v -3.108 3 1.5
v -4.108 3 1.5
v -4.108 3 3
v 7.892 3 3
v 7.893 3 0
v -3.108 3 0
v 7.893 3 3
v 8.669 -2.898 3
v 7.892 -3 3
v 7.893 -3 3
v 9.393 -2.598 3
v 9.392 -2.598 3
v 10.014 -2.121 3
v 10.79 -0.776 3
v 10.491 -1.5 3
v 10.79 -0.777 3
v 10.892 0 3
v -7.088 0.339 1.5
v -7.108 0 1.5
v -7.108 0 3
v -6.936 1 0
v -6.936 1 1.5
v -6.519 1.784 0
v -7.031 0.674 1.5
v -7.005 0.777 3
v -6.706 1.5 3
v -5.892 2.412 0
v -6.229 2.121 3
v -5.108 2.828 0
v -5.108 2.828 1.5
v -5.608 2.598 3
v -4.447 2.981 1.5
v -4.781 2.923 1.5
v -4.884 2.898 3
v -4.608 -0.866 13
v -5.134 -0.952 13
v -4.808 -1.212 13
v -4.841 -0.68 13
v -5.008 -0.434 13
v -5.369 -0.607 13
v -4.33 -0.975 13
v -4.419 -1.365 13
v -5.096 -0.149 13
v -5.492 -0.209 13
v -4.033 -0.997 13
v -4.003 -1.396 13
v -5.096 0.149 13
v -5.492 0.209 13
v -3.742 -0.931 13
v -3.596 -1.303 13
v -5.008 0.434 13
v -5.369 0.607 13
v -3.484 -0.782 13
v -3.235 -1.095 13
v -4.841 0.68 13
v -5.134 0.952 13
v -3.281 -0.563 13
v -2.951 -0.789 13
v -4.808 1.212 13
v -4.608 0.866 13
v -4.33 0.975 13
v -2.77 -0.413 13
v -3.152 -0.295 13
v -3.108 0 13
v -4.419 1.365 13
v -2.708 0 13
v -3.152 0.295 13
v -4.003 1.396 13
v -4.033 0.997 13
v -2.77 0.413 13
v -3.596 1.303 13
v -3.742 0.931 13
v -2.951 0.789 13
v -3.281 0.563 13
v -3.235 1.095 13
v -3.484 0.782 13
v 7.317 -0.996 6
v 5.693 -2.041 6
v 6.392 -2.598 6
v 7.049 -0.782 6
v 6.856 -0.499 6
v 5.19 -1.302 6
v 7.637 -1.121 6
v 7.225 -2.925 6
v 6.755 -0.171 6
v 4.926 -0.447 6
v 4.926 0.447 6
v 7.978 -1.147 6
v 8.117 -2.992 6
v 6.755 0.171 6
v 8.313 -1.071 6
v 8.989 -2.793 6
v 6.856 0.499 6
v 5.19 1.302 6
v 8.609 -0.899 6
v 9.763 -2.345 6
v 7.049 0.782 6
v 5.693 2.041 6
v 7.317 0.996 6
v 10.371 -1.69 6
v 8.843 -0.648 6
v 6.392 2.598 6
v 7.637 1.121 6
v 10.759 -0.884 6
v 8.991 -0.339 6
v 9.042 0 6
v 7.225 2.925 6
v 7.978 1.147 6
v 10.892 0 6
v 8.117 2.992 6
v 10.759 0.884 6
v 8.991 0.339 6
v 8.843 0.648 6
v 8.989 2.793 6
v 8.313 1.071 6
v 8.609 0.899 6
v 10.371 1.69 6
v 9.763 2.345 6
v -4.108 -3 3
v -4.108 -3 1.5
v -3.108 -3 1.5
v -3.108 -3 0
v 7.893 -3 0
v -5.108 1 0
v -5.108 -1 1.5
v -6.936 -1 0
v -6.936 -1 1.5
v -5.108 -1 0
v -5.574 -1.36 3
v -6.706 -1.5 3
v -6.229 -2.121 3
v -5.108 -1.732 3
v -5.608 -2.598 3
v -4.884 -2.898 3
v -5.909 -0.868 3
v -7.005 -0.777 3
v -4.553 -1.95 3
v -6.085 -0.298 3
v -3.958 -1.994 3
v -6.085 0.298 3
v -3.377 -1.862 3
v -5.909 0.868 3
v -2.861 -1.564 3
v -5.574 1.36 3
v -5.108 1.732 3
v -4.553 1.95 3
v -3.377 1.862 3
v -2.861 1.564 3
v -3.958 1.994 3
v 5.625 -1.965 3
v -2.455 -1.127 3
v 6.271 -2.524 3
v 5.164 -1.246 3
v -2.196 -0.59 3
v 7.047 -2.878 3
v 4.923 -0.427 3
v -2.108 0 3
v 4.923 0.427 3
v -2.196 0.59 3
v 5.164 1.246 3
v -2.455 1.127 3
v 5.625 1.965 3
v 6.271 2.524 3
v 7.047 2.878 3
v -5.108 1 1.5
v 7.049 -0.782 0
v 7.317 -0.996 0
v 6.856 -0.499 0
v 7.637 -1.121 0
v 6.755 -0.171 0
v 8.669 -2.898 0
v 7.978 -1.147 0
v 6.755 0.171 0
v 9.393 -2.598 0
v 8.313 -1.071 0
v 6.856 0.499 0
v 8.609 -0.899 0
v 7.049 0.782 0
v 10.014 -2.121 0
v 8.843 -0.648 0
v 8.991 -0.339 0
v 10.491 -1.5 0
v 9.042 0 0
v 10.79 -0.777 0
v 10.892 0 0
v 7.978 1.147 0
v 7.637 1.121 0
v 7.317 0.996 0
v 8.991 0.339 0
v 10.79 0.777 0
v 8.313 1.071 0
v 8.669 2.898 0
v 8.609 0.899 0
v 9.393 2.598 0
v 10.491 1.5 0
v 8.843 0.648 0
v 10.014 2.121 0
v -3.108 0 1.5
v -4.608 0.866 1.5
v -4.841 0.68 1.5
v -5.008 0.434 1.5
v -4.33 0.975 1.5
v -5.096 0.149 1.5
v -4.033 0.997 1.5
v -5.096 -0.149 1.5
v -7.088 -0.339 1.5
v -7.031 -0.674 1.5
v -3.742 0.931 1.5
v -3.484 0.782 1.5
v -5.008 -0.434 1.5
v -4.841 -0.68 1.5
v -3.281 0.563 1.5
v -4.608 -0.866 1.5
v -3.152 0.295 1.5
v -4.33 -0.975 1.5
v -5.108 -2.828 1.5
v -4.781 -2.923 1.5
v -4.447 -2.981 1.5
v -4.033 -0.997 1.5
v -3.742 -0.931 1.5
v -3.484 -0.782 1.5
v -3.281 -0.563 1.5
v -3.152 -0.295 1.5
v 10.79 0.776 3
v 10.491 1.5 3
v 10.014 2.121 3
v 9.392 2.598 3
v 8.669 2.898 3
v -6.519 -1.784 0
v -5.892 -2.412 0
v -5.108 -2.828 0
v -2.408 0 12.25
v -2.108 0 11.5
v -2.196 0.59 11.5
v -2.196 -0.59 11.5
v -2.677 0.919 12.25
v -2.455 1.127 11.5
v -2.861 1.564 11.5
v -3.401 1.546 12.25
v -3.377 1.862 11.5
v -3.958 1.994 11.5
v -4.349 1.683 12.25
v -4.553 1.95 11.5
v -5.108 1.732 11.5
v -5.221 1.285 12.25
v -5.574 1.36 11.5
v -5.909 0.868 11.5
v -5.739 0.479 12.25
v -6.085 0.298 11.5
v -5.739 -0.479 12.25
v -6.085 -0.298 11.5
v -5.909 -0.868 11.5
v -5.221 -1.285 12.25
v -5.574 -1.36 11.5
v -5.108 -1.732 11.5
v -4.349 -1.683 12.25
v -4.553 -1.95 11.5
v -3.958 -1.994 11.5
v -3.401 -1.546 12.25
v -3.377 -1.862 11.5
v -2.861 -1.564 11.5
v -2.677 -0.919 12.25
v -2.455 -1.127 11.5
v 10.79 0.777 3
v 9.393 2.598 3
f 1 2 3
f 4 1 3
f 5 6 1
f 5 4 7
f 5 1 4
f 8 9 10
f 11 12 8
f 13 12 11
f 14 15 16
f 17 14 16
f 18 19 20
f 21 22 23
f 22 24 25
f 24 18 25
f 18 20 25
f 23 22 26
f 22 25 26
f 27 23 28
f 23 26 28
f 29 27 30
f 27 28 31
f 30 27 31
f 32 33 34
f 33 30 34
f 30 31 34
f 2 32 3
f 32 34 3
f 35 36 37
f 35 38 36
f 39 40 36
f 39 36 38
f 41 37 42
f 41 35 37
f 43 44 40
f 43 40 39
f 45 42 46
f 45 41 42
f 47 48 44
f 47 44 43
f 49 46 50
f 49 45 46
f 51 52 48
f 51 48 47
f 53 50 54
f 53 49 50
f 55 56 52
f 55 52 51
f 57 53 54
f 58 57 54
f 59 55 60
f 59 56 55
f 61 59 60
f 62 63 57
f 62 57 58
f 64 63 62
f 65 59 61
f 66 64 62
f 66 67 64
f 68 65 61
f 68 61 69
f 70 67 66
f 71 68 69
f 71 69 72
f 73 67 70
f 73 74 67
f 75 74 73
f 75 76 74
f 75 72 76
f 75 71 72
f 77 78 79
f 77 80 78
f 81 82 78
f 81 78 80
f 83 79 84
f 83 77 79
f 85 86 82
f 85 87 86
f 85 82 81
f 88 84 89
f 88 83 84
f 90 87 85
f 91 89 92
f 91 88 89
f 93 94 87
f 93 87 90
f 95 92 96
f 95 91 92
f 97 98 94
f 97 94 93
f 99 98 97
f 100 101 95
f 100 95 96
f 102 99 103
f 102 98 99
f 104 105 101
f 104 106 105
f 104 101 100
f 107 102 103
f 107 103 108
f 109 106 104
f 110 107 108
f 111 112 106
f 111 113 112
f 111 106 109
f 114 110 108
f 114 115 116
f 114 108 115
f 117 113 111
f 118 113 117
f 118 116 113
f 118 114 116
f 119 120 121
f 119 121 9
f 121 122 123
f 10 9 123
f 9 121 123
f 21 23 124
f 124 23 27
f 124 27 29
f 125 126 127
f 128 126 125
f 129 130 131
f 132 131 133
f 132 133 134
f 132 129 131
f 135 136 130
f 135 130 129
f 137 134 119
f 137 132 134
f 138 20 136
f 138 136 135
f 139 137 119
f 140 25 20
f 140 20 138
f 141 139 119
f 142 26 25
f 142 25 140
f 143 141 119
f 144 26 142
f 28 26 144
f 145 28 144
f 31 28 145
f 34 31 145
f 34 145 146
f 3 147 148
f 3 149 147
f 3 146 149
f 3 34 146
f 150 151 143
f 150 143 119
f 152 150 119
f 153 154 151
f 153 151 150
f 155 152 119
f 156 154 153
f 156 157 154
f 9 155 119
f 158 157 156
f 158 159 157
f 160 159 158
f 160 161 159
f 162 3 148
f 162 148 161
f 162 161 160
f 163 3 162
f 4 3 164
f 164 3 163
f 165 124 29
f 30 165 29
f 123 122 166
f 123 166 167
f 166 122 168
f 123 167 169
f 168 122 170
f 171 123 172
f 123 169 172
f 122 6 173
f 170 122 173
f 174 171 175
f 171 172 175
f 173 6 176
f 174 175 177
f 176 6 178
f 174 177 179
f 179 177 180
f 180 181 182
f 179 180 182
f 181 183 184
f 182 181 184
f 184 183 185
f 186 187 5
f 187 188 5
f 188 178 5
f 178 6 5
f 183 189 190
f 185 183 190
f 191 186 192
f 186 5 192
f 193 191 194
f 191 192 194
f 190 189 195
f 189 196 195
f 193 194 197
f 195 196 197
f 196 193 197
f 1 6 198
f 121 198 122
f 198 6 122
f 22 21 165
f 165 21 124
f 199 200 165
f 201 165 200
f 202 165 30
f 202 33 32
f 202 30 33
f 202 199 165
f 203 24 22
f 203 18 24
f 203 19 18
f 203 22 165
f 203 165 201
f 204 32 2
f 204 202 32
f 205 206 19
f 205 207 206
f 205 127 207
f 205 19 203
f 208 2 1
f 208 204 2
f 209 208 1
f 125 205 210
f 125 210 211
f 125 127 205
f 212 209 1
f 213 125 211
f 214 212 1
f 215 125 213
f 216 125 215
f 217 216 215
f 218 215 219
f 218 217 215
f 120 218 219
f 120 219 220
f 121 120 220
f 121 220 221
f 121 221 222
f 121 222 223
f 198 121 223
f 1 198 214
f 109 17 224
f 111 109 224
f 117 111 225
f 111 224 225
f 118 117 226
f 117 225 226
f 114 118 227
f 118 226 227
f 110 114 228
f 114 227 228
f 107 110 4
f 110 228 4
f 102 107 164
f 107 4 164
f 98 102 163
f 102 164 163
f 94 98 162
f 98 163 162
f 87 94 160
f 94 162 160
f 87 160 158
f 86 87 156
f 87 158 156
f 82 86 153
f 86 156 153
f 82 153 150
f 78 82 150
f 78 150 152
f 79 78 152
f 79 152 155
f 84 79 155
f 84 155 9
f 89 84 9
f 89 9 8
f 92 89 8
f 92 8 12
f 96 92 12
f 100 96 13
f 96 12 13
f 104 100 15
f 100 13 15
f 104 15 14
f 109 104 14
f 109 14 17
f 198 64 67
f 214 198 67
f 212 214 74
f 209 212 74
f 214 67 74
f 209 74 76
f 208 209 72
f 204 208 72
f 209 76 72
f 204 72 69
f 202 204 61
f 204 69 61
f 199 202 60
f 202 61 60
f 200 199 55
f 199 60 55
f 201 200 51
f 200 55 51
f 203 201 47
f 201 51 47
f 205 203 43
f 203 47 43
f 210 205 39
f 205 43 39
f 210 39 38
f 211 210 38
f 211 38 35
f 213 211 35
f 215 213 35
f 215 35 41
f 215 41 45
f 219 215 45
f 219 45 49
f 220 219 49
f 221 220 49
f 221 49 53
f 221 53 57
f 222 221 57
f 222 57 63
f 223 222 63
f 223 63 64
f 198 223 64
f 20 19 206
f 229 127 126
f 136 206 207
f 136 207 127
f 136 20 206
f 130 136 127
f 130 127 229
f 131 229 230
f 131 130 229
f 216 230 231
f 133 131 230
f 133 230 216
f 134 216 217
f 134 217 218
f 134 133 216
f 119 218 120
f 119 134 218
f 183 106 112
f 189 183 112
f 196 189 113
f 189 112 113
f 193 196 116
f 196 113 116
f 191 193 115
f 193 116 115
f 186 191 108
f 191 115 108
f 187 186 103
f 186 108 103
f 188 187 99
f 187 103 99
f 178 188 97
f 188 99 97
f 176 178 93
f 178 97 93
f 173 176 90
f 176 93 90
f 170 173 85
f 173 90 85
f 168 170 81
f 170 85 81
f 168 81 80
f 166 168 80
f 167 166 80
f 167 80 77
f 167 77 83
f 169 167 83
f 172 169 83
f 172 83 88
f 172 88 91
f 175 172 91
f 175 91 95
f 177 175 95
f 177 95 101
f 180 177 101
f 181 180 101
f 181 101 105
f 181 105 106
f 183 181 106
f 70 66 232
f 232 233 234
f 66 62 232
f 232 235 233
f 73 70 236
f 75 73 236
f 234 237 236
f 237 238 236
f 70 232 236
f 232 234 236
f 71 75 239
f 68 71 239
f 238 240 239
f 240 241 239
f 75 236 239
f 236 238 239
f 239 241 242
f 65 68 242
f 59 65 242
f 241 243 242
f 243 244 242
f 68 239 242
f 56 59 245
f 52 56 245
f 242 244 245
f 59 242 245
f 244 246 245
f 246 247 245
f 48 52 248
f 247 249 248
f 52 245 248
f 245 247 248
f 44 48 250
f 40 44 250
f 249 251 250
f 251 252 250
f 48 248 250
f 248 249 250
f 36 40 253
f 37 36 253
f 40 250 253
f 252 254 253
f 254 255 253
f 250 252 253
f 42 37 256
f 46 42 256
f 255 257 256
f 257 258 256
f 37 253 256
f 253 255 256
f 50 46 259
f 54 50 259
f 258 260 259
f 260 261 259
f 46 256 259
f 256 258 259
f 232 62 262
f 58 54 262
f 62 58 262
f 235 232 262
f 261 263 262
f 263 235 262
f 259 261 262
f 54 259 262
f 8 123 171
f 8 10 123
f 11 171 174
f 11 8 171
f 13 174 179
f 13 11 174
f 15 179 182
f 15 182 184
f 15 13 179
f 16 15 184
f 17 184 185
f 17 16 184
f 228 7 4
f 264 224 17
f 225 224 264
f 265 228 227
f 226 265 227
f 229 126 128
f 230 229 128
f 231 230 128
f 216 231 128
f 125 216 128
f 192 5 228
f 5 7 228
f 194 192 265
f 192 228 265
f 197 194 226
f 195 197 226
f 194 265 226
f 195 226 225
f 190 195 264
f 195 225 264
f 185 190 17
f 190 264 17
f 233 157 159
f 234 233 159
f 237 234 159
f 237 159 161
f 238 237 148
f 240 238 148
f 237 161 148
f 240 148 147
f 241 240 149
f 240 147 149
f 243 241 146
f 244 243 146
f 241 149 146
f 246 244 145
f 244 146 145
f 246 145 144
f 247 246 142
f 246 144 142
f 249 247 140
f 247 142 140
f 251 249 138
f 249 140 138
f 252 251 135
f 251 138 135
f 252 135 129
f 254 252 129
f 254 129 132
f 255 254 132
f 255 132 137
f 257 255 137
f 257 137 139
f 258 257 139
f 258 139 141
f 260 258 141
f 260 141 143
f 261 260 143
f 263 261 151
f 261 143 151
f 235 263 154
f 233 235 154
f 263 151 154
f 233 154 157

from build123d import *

# Parameters (mm, degrees)
F0_W      = 18
F0_H      = 6
F1_DEPTH  = 3
F2_R      = 3
F2_R_2    = 2
F3_DEPTH  = 10
F4_R      = 1
F4_R_2    = 1.15
F5_DEPTH  = 20
F6_SIZE2  = 1.5
F6_SIZE   = 0.6
F7_W      = 11.6012076614
F7_H      = 11.8295210414
F8_DEPTH  = 7
F9_R      = 2.9999
F10_W     = 5.4413094251
F10_H     = 2
F11_DEPTH = 1.5


# Not quite as in the source:
# - a fillet or chamfer is up to 0.001 mm smaller than in the source, because OpenCascade refuses the exact size


with BuildPart() as f1:
    # F0 (on Top) → F1 (new body)
    with BuildSketch(Plane.XY):
        with Locations((1.8924829921, 0)):
            Rectangle(F0_W, F0_H)
    extrude(amount=F1_DEPTH)

    # F2 (on face) → F3 (join)
    with BuildSketch(Plane.XY.offset(3)):
        with Locations((7.8924829921, 0)):
            Circle(F2_R)
        with Locations((-4.1075170079, 0)):
            Circle(F2_R_2)
    extrude(amount=F3_DEPTH)

    # F4 (on face) → F5 (cut)
    with BuildSketch(Plane.XY.offset(13)):
        with Locations((-4.1075170079, 0)):
            Circle(F4_R)
        with Locations((7.8924829921, 0)):
            Circle(F4_R_2)
    extrude(amount=-F5_DEPTH, mode=Mode.SUBTRACT)

    # F6
    f6_edges = [f1.edges().sort_by_distance(p)[0] for p in [
        (-6.107517, 0, 13),
    ]]
    f6_side = f1.faces().sort_by_distance((-6.050948, 0, 13))[0]
    chamfer(f6_edges, length=F6_SIZE, length2=F6_SIZE2, reference=f6_side)

    # F7 (on face) → F8 (cut)
    with BuildSketch(Plane.XY.offset(13)):
        with Locations((7.5882198871, -0.5373002496)):
            Rectangle(F7_W, F7_H)
    extrude(amount=-F8_DEPTH, mode=Mode.SUBTRACT)

    # F9 (radius 3 in the source; OpenCascade refuses exactly that, so slightly less here)
    f9_edges = [f1.edges().sort_by_distance(p)[0] for p in [
        (10.892483, -3, 1.5),
        (10.892483, 3, 1.5),
        (-7.107517, 3, 1.5),
        (-7.107517, -3, 1.5),
    ]]
    fillet(f9_edges, radius=F9_R)

    # F10 (on face) → F11 (cut)
    with BuildSketch(Plane(origin=(0, 0, 0), x_dir=(1, 0, 0), z_dir=(0, 0, -1))):
        Polygon((-3.1075170079, 5.622364855), (-5.1075170079, 5.622364855), (-5.1075170079, 1), (-5.1075170079, -1), (-5.1075170079, -5.5661949279), (-3.1075170079, -5.5661949279), align=None)
        with Locations((-7.8281717205, 0)):
            Rectangle(F10_W, F10_H)
    extrude(amount=-F11_DEPTH, mode=Mode.SUBTRACT)


solid = f1.part
